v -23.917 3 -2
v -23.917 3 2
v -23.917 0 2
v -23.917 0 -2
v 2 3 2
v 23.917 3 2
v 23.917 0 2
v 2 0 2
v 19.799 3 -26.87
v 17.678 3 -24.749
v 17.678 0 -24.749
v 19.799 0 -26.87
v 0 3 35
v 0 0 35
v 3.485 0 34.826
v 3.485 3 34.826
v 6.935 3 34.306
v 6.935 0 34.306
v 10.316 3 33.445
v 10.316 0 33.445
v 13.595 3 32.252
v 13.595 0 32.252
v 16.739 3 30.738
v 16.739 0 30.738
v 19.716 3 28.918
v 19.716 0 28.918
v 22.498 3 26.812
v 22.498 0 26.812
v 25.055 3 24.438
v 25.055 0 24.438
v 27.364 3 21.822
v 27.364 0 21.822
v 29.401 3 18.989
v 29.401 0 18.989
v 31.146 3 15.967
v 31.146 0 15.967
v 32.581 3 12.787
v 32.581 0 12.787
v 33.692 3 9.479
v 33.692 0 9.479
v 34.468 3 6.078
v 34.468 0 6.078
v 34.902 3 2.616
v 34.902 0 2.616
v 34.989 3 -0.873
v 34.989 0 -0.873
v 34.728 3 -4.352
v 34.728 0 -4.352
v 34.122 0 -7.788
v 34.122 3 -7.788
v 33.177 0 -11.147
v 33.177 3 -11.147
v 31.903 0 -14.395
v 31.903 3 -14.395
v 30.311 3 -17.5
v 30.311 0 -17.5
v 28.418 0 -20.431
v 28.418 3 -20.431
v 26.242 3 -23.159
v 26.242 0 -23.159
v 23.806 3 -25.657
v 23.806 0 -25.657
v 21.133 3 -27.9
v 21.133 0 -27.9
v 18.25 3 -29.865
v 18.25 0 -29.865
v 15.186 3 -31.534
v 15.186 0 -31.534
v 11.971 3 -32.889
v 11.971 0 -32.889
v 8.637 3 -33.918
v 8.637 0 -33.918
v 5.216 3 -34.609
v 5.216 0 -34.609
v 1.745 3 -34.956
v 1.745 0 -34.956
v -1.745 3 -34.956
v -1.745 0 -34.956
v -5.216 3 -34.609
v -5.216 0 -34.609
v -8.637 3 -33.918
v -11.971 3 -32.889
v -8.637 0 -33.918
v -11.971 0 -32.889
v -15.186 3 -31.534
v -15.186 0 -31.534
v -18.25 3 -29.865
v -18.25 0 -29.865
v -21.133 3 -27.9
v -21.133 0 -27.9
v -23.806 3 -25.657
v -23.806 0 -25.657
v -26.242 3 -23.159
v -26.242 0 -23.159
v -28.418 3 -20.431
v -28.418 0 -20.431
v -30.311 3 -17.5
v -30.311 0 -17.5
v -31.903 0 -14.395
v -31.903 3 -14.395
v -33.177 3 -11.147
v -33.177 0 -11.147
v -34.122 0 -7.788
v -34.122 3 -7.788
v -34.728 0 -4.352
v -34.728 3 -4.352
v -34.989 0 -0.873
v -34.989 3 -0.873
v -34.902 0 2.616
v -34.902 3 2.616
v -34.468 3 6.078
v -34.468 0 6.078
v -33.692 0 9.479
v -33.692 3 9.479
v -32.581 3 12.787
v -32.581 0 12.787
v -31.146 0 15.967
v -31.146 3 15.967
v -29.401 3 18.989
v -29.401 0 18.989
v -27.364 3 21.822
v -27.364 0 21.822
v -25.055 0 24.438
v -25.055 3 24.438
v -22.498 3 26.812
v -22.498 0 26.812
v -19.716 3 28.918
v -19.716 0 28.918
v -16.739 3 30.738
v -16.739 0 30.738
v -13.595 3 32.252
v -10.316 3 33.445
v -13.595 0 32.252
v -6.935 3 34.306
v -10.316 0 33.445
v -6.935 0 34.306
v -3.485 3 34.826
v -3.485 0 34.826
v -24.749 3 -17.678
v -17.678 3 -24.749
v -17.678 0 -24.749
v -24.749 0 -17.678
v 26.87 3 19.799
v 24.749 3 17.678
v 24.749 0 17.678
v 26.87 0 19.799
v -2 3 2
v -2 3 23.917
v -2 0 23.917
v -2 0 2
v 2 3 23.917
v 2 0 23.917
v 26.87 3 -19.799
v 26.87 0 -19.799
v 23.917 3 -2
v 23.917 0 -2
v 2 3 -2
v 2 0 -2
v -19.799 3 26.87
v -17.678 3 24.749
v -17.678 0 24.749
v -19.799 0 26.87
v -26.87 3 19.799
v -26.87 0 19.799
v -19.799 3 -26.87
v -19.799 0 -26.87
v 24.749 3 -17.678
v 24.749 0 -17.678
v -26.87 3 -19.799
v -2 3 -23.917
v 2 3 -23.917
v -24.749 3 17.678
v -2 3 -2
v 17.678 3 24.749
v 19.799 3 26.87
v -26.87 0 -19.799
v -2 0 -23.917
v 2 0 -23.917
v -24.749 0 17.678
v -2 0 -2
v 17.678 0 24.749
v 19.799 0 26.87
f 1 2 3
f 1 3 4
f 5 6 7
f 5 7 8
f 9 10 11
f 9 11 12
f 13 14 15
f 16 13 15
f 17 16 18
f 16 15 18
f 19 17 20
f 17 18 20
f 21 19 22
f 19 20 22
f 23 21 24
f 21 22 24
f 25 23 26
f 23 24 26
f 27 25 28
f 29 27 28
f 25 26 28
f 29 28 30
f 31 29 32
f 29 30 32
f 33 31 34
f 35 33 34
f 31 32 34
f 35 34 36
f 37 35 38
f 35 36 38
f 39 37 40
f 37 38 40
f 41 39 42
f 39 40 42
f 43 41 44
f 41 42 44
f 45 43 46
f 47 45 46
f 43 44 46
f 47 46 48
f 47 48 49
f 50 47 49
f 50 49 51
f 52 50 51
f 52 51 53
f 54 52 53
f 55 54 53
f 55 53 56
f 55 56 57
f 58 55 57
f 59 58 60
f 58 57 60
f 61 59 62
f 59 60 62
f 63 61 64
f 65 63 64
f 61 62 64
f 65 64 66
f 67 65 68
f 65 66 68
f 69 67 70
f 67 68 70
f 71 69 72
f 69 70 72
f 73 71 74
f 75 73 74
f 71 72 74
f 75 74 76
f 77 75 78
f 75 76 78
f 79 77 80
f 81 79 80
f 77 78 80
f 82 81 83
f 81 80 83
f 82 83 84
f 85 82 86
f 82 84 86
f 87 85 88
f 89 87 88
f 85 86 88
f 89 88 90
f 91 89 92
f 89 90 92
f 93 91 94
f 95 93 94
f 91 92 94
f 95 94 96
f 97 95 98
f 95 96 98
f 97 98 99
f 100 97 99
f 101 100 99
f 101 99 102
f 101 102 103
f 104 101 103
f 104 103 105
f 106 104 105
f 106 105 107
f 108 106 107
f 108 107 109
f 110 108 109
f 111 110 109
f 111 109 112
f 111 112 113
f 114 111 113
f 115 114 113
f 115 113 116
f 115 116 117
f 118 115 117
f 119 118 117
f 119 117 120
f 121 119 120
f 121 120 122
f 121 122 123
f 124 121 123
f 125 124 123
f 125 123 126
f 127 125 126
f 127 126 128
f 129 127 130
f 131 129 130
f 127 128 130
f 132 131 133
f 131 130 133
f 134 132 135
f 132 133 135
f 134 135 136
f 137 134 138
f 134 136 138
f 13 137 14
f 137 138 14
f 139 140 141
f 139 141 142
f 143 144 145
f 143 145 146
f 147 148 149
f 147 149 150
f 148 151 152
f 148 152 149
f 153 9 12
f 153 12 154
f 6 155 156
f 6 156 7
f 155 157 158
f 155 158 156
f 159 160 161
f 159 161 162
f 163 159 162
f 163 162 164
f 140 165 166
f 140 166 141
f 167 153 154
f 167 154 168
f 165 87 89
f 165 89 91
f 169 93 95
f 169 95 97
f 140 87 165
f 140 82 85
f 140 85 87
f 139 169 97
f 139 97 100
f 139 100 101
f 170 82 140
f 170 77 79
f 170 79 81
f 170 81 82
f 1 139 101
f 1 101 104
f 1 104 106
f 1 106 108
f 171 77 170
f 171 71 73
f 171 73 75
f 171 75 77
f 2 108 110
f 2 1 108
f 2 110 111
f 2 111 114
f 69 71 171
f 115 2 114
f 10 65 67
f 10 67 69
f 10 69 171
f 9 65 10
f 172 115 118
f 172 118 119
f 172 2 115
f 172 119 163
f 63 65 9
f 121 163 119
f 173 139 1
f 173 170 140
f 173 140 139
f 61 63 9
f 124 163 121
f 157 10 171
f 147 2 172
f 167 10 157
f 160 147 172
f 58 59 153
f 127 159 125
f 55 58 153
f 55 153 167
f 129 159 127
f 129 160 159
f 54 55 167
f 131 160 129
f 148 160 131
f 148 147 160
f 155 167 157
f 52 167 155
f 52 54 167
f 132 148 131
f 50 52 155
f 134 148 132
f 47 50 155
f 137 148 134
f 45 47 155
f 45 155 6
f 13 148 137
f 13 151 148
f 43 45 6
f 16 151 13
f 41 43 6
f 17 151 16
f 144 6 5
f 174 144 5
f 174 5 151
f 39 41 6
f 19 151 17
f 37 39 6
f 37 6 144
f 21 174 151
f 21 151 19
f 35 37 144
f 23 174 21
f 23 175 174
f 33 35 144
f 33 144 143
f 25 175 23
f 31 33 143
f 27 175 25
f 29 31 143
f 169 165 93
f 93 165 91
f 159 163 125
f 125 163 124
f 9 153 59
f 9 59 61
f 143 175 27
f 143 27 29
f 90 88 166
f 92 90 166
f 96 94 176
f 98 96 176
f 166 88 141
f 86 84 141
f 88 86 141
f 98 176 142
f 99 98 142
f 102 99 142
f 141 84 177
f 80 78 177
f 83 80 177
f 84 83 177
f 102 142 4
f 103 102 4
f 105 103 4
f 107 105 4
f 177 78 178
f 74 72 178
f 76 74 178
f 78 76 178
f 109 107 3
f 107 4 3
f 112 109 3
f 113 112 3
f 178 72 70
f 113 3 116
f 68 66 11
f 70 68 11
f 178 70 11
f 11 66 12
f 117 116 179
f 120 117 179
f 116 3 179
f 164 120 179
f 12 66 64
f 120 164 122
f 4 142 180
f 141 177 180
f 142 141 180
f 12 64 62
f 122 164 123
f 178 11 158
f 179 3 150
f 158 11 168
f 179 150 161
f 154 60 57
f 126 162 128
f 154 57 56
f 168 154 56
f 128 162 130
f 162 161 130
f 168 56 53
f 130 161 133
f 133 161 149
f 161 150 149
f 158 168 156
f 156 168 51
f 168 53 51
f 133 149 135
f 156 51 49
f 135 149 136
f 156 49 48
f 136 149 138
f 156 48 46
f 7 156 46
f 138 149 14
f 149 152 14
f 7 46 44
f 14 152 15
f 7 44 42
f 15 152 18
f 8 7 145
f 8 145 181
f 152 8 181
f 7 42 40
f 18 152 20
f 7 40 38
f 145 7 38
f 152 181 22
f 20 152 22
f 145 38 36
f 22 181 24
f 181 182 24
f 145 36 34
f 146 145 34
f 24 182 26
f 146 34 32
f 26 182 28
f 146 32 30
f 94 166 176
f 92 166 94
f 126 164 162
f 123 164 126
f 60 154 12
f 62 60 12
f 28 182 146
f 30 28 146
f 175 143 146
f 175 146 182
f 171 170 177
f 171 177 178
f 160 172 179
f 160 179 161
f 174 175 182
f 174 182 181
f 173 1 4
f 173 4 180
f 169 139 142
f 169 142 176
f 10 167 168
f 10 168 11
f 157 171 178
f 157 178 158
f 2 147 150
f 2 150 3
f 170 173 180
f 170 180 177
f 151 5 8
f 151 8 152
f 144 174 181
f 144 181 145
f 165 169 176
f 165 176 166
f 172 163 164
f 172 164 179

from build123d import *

# Parameters (mm, degrees)
SKICA1_R                 = 35
P_IDAT_VYSUNUT_M1_DEPTH  = 3
ODEBRAT_VYSUNUT_M1_DEPTH = 3
ODEBRAT_VYSUNUT_M3_DEPTH = 3


with BuildPart() as part:
    # Skica1 → Přidat vysunutím1 (new body)
    with BuildSketch(Plane(origin=(0, 0, 0), x_dir=(1, 0, 0), z_dir=(0, 1, 0))):
        with Locations(Location((0, 0, 0), (0, 0, 270))):
            Circle(SKICA1_R)
    extrude(amount=P_IDAT_VYSUNUT_M1_DEPTH)

    # Skica2 → Odebrat vysunutím1 (cut)
    with BuildSketch(Plane(origin=(0, 3, 0), x_dir=(1, 0, 0), z_dir=(0, 1, 0))):
        Polygon((2, 23.916521486), (2, 2), (23.916521486, 2), (23.916521486, -2), (2, -2), (2, -23.916521486), (-2, -23.916521486), (-2, -2), (-23.916521486, -2), (-23.916521486, 2), (-2, 2), (-2, 23.916521486), align=None)
    extrude(amount=-ODEBRAT_VYSUNUT_M1_DEPTH, mode=Mode.SUBTRACT)

    # Skica3 → Odebrat vysunutím3 (cut)
    with BuildSketch(Plane(origin=(0, 3, 0), x_dir=(1, 0, 0), z_dir=(0, 1, 0))):
        Polygon((19.798989873, 26.870057685), (26.870057685, 19.798989873), (24.748737342, 17.67766953), (17.67766953, 24.748737342), align=None)
        Polygon((26.870057685, -19.798989873), (19.798989873, -26.870057685), (17.67766953, -24.748737342), (24.748737342, -17.67766953), align=None)
        Polygon((-19.798989873, -26.870057685), (-26.870057685, -19.798989873), (-24.748737342, -17.67766953), (-17.67766953, -24.748737342), align=None)
        Polygon((-26.870057685, 19.798989873), (-19.798989873, 26.870057685), (-17.67766953, 24.748737342), (-24.748737342, 17.67766953), align=None)
    extrude(amount=-ODEBRAT_VYSUNUT_M3_DEPTH, mode=Mode.SUBTRACT)


solid = part.part
